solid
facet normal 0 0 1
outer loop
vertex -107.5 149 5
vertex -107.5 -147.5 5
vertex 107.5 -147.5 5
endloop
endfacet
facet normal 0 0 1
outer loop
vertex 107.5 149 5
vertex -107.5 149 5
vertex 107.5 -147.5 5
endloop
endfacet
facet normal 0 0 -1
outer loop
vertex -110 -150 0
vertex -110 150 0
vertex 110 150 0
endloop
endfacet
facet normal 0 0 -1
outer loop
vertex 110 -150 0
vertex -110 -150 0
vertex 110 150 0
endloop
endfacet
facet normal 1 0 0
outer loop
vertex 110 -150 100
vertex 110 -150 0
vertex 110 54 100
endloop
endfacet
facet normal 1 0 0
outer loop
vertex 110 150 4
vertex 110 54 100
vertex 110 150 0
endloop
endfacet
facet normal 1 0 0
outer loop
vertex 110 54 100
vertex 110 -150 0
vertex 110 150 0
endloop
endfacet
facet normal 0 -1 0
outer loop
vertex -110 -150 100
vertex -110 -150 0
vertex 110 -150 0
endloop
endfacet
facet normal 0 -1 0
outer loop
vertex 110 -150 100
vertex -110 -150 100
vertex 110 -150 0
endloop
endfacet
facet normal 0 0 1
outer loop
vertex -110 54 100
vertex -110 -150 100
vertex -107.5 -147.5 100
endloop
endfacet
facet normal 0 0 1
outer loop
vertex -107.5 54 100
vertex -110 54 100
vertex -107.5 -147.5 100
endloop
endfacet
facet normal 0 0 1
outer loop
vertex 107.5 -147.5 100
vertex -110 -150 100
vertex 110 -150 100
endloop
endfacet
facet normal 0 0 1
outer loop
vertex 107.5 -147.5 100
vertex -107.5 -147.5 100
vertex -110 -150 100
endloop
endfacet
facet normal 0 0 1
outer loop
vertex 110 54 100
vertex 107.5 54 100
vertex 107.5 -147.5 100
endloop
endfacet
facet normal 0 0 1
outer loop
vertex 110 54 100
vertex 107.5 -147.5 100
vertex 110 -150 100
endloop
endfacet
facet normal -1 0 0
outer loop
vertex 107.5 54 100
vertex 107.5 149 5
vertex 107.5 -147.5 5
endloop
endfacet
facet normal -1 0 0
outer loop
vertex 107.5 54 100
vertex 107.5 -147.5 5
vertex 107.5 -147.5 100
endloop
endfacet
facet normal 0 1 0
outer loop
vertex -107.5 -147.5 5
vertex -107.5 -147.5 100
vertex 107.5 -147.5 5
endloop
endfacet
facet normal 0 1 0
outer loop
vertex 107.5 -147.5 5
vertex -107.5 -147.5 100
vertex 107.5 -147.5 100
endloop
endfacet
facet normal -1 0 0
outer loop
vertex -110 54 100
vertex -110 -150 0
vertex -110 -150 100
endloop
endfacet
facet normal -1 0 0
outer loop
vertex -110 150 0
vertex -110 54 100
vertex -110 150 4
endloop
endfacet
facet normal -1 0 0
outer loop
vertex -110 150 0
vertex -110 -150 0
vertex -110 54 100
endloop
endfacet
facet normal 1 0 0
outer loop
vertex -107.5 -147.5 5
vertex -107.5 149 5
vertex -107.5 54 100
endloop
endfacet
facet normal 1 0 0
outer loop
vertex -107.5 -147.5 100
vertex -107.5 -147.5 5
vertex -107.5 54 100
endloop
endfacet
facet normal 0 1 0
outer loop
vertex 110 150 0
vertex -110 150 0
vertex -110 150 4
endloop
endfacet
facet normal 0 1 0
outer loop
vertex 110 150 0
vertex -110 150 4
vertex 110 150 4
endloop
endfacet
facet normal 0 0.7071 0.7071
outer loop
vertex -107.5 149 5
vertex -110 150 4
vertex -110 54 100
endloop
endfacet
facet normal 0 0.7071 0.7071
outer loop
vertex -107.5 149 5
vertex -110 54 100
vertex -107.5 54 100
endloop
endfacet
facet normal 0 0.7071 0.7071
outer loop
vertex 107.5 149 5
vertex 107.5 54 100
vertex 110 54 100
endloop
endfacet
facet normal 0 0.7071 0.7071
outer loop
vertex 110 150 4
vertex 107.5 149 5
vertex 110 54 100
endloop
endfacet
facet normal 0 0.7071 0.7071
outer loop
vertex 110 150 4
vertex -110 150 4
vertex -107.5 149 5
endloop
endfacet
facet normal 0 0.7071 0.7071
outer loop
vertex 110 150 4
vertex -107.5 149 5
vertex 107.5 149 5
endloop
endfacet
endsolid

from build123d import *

# Parameters (mm, degrees)
F0_W     = 220
F0_H     = 300
F1_DEPTH = 100
F2_W     = 215
F2_H     = 295
F3_DEPTH = 95
F4_W     = 215
F4_H     = 95
F5_DEPTH = 5
F6_SIZE  = 96


with BuildPart() as f1:
    # F0 (on Top) → F1 (new body)
    with BuildSketch(Plane.XY):
        Rectangle(F0_W, F0_H)
    extrude(amount=F1_DEPTH)

    # F2 (on face) → F3 (cut)
    with BuildSketch(Plane.XY.offset(100)):
        Rectangle(F2_W, F2_H)
    extrude(amount=-F3_DEPTH, mode=Mode.SUBTRACT)

    # F4 (on face) → F5 (cut)
    with BuildSketch(Plane.XZ.offset(-147.5)):
        with Locations((0, 52.5)):
            Rectangle(F4_W, F4_H)
    extrude(amount=-F5_DEPTH, mode=Mode.SUBTRACT)

    # F6
    f6_edges = [f1.edges().sort_by_distance(p)[0] for p in [
        (-108.75, 150, 100),
    ]]
    chamfer(f6_edges, length=F6_SIZE)


solid = f1.part
